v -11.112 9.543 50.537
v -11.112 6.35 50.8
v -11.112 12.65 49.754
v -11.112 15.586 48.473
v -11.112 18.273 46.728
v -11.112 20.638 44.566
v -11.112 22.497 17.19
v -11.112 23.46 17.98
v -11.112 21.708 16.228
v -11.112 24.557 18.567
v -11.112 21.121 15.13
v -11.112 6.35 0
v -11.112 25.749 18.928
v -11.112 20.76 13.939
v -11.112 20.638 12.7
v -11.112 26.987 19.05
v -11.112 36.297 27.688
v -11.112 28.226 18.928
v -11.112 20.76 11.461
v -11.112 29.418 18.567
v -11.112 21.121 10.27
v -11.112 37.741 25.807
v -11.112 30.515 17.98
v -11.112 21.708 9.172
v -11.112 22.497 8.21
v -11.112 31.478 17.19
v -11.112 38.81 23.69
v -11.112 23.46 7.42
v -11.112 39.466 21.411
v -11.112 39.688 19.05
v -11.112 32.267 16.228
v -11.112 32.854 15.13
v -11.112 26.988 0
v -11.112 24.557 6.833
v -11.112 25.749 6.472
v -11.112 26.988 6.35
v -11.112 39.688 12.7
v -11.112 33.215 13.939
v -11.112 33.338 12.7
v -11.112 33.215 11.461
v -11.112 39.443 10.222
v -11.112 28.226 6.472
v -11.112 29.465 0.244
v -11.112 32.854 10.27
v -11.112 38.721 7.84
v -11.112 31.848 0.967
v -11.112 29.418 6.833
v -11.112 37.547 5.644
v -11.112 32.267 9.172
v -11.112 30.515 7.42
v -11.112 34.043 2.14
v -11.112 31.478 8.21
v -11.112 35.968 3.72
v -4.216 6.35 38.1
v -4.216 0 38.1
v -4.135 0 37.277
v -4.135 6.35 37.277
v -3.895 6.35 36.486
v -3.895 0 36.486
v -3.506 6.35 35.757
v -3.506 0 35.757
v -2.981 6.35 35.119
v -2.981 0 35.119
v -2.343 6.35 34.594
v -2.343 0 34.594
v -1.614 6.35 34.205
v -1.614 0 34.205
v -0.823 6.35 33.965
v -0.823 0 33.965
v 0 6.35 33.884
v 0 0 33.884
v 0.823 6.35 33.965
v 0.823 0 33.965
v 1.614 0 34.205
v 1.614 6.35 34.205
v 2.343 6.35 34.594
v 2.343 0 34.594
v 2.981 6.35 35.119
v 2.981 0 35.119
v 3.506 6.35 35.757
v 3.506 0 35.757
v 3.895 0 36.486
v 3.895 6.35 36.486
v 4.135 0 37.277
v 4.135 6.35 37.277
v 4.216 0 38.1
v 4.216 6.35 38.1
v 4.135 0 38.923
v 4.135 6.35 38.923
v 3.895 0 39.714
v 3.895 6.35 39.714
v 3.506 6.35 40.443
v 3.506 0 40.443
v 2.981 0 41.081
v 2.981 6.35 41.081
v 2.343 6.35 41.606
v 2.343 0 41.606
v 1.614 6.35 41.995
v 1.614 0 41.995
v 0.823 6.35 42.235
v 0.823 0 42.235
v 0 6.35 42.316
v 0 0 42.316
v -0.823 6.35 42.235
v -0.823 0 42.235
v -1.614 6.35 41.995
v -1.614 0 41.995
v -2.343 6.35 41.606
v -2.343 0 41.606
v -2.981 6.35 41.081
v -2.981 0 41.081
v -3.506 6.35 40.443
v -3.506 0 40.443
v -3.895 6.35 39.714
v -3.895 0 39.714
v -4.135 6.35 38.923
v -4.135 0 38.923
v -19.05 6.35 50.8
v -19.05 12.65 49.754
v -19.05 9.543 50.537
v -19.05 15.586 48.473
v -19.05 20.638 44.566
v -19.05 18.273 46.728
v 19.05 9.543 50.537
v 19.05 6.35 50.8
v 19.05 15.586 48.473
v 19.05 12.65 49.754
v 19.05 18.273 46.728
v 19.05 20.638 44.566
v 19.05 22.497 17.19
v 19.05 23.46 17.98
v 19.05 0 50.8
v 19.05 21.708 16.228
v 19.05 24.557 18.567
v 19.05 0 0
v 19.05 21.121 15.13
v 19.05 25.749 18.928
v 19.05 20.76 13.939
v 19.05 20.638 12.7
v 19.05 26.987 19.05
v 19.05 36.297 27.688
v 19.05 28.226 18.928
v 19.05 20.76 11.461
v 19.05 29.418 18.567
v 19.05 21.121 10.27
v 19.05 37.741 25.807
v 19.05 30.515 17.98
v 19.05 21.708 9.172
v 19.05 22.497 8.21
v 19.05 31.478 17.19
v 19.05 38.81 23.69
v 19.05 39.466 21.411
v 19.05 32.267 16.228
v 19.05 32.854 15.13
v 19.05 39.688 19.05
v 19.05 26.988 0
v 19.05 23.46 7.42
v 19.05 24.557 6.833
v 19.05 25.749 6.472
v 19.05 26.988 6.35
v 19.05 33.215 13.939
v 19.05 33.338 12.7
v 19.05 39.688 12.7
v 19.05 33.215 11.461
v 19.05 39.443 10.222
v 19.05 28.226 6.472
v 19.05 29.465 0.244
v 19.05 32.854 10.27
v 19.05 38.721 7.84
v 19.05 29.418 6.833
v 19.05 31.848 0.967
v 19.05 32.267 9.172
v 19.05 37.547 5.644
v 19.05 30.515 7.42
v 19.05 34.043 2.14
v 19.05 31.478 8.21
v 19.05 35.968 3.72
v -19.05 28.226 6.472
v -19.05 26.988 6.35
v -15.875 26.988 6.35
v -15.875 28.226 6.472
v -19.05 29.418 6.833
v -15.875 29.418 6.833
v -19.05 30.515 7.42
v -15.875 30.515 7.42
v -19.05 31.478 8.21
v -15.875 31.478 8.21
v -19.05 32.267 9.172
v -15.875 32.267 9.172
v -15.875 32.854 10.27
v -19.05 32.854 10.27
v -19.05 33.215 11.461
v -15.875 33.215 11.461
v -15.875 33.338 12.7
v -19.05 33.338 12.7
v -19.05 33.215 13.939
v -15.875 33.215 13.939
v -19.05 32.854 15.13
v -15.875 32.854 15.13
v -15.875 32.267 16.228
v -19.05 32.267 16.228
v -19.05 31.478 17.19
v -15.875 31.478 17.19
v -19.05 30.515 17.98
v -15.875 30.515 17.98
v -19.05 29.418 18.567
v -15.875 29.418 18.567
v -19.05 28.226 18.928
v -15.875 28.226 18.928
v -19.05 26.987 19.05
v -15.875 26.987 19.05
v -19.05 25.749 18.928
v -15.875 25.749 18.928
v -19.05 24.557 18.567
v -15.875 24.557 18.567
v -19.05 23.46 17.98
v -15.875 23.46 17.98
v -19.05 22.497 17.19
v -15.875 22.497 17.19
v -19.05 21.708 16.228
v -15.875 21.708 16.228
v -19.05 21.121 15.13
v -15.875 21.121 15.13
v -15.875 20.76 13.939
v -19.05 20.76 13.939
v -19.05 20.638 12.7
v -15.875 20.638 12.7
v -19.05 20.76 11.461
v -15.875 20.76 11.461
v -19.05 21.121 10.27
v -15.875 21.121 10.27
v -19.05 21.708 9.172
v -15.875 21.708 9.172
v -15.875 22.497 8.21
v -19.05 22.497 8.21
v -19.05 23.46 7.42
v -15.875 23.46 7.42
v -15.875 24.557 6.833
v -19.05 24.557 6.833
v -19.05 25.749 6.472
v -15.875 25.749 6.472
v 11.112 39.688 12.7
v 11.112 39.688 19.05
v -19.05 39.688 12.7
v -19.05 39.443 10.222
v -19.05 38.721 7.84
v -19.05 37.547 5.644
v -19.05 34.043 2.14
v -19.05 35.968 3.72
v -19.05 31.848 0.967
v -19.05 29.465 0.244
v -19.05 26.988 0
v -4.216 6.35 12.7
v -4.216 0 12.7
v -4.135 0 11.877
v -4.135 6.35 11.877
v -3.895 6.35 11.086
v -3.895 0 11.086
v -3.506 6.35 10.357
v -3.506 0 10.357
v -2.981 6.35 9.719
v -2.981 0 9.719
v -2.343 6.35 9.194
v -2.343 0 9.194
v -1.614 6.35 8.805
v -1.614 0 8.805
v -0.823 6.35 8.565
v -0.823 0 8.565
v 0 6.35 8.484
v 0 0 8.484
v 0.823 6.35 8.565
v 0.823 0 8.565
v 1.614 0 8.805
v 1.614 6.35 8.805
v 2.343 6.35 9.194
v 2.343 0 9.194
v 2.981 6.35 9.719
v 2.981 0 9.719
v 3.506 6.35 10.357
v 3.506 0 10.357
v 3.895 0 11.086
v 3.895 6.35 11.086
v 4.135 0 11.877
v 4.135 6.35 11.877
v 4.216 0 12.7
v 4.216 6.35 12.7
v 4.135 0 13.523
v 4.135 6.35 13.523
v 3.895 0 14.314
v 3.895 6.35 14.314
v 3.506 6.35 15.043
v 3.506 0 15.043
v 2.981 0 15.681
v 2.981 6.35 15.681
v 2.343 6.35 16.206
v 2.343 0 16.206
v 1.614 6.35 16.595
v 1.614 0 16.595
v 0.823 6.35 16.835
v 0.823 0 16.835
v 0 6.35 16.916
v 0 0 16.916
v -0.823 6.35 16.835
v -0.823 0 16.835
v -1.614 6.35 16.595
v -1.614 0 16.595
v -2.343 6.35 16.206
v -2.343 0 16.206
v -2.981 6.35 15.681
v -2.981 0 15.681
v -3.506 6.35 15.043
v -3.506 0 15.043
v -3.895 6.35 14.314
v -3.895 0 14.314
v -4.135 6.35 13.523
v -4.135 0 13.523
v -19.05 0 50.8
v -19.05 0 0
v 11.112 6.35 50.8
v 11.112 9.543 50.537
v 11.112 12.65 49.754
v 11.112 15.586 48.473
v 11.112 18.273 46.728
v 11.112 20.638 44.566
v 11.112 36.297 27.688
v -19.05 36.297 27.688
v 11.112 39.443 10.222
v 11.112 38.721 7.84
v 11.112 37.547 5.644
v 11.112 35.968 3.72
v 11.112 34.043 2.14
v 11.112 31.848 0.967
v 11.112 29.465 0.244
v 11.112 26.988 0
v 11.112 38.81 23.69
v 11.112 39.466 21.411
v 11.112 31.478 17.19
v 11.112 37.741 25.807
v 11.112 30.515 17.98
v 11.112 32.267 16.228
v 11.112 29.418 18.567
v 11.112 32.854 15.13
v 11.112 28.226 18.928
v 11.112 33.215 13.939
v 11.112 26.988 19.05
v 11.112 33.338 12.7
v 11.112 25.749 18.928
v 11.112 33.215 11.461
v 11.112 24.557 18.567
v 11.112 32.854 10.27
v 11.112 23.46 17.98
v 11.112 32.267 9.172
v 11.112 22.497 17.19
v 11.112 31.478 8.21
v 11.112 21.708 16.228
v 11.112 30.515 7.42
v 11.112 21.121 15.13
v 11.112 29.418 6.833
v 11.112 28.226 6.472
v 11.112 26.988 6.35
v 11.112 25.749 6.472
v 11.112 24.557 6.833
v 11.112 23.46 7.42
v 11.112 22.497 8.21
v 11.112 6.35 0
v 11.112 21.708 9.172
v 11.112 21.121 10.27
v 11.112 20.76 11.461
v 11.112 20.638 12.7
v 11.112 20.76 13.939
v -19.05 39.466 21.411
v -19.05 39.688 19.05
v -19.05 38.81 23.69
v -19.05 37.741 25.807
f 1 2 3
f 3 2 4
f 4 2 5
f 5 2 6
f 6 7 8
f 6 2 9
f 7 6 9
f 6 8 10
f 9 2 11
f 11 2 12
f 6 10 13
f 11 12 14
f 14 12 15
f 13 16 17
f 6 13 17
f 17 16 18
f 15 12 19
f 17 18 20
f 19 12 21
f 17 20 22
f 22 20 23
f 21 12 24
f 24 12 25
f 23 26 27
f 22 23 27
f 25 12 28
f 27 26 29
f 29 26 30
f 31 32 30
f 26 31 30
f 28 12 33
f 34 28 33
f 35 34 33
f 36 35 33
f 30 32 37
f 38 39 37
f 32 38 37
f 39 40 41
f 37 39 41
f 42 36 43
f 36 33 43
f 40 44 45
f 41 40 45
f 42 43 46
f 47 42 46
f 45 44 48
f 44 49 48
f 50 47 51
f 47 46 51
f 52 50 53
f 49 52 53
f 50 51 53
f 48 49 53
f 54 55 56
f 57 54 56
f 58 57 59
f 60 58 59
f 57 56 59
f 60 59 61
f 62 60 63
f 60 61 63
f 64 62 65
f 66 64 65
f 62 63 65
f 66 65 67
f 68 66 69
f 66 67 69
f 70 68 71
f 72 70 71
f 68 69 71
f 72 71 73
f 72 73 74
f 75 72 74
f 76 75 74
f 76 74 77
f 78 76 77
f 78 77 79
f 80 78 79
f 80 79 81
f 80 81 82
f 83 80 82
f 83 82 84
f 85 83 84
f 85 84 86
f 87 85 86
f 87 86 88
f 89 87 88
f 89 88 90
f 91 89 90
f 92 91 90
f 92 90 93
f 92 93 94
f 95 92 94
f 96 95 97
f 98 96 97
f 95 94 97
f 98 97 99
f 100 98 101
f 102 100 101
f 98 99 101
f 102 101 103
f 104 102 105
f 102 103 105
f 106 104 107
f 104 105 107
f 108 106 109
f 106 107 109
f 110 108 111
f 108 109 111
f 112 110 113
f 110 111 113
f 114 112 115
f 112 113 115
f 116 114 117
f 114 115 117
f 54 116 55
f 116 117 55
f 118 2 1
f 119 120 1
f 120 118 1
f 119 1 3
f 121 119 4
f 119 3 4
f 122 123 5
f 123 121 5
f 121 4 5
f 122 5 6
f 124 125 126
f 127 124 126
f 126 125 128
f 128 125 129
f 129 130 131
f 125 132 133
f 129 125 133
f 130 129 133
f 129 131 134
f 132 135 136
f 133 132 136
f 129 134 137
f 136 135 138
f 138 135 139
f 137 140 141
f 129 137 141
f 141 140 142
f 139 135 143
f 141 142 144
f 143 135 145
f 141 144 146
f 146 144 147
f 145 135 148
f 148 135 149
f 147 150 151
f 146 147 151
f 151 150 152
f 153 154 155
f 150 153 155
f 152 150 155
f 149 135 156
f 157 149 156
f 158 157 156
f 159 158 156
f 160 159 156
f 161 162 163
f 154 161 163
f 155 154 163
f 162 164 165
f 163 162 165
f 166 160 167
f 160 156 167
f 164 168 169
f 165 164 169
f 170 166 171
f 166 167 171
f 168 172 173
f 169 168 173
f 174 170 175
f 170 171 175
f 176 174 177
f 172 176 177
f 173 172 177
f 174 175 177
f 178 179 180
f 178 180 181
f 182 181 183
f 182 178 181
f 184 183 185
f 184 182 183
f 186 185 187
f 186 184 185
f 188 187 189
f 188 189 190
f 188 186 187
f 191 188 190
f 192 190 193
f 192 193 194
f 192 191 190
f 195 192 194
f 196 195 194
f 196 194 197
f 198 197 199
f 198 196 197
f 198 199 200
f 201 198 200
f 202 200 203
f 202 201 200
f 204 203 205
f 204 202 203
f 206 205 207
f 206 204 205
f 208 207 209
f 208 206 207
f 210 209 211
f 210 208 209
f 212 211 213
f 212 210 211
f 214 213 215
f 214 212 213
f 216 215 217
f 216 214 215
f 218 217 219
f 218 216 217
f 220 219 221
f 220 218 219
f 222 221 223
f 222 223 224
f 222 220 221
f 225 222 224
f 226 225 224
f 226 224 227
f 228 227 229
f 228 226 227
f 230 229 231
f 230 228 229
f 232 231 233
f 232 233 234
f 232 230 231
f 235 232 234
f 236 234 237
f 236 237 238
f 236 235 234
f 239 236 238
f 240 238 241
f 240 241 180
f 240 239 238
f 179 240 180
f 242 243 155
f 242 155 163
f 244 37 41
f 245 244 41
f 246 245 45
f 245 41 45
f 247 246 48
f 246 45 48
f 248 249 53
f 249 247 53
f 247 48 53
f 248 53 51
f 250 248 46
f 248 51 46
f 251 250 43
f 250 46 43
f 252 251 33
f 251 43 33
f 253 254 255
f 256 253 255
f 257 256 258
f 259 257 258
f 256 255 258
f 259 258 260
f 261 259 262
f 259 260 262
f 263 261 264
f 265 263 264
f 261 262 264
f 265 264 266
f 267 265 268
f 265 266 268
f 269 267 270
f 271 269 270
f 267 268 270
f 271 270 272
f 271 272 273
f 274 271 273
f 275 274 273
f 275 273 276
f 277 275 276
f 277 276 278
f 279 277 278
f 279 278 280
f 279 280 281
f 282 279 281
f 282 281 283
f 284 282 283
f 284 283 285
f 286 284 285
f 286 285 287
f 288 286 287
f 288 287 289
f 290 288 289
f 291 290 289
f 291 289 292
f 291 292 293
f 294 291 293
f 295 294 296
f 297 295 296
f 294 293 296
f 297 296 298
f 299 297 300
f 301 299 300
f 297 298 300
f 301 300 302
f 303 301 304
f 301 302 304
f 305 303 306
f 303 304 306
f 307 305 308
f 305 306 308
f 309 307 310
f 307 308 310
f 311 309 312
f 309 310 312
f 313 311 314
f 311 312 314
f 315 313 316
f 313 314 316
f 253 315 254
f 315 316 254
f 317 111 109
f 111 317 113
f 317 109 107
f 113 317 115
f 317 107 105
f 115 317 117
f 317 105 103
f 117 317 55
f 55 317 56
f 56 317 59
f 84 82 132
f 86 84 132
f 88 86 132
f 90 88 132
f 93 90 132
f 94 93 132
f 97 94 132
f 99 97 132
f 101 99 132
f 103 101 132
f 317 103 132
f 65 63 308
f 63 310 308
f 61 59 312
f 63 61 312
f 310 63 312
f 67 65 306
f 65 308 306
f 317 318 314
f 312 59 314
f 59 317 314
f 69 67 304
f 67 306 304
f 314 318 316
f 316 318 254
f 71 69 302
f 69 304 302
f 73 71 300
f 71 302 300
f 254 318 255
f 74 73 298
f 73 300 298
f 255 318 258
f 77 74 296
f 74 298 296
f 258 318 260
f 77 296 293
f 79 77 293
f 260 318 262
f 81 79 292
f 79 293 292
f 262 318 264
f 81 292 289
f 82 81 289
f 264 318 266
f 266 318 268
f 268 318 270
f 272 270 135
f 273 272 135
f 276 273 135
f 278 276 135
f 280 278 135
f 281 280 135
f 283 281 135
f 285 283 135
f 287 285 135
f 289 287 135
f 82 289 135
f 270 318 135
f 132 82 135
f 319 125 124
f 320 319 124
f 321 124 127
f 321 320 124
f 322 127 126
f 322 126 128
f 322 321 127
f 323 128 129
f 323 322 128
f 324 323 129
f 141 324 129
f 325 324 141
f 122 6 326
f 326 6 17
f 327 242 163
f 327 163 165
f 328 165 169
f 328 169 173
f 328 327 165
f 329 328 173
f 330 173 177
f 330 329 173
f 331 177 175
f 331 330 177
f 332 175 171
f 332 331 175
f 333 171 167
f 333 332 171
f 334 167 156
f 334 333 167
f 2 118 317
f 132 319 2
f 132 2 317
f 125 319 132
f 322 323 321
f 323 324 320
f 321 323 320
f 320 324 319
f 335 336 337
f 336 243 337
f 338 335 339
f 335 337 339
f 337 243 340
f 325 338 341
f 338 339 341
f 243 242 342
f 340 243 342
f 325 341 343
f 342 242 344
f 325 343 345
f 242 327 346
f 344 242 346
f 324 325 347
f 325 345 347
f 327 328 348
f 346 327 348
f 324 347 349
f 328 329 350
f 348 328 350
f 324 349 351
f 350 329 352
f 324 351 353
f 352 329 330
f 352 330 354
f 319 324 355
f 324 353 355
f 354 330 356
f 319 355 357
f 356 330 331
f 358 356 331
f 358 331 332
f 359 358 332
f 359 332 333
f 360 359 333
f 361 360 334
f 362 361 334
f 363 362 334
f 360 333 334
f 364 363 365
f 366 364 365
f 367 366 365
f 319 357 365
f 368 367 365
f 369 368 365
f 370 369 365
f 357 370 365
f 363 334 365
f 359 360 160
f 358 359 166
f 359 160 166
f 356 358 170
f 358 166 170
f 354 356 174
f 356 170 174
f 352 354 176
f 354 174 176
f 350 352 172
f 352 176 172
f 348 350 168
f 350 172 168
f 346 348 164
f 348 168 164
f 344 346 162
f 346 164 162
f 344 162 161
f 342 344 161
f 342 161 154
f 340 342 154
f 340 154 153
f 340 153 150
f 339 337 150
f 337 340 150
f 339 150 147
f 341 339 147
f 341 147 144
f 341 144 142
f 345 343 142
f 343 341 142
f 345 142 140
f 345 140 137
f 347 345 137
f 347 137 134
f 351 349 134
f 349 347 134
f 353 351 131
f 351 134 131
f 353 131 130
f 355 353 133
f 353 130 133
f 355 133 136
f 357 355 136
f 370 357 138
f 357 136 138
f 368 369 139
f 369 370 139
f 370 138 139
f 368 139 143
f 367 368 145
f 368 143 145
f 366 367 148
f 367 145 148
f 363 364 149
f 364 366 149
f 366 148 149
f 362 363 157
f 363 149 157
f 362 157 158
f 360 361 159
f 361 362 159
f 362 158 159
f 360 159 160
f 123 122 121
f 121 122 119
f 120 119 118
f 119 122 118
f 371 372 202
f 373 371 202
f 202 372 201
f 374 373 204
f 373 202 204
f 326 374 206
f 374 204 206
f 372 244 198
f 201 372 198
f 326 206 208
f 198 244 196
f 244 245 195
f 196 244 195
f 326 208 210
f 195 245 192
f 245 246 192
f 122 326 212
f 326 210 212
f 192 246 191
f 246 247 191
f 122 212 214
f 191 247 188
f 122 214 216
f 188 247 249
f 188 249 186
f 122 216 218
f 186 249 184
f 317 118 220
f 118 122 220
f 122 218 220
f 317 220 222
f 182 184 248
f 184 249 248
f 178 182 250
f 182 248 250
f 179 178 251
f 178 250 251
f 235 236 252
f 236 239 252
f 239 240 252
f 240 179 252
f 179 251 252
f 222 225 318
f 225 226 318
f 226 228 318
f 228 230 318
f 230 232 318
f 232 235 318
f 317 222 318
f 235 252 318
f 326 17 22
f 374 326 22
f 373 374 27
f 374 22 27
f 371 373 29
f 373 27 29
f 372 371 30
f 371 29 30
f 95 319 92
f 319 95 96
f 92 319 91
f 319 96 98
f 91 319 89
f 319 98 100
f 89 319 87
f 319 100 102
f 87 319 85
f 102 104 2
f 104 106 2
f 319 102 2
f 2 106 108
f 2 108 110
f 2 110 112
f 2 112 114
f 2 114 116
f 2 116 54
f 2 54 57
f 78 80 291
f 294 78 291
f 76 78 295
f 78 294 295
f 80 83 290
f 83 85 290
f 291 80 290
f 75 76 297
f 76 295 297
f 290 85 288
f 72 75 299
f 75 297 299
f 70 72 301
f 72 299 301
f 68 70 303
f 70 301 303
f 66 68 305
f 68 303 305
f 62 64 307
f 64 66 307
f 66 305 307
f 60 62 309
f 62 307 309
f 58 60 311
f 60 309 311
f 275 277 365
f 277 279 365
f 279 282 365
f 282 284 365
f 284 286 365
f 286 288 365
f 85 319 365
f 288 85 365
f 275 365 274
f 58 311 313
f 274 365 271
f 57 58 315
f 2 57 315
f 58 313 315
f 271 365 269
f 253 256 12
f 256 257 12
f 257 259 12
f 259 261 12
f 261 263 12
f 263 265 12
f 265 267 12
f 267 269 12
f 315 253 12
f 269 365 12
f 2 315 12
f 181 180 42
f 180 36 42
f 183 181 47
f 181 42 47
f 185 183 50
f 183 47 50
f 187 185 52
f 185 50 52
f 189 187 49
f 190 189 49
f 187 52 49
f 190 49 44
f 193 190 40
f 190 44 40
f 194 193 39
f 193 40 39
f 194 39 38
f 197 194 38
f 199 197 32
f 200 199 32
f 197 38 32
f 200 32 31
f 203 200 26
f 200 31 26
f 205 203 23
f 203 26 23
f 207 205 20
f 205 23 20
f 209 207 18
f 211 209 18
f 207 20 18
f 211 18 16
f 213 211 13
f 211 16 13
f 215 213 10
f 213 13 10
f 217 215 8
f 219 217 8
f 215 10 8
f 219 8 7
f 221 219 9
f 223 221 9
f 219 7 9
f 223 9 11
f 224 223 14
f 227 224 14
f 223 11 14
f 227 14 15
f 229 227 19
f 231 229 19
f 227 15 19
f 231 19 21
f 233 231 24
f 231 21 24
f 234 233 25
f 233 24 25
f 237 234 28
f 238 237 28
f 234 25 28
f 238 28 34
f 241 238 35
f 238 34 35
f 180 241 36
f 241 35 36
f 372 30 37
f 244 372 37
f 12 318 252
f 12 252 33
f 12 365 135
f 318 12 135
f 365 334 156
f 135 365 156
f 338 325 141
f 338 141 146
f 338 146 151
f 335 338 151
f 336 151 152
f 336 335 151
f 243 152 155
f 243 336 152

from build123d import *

# Parameters (mm, degrees)
BOSS_EXTRUDE1_DEPTH          = 50.8
CUT_EXTRUDE2_START           = -19.05
SKETCH2_3_R                  = 6.35
CUT_EXTRUDE2_DEPTH           = 3.175
SKETCH2_R                    = 6.35
CUT_EXTRUDE3_DEPTH           = 20.05
CUT_EXTRUDE3_DEPTH_BACK      = 20.05
F_5_16_CLEARANCE_HOLE1_D     = 8.4328
F_5_16_CLEARANCE_HOLE1_DEPTH = 19.05
F_5_16_CLEARANCE_HOLE1_TIP   = 2.533468714
CUT_EXTRUDE12_DEPTH          = 20.05
CUT_EXTRUDE12_DEPTH_BACK     = 20.05


with BuildPart() as part:
    # Sketch1 → Boss-Extrude1 (new body)
    with BuildSketch(Plane.XY):
        Polygon((-19.05, 0), (19.05, 0), (19.05, 50.8), (11.1125, 50.8), (11.1125, 6.35), (-11.1125, 6.35), (-11.1125, 50.8), (-19.05, 50.8), align=None)
    extrude(amount=BOSS_EXTRUDE1_DEPTH)

    # Sketch2_3 → Cut-Extrude2 (cut)
    with BuildSketch(Plane(origin=(0, 0, 0), x_dir=(0, 0, -1), z_dir=(1, 0, 0)).offset(CUT_EXTRUDE2_START)):
        with Locations((-12.7, 26.9875)):
            Circle(SKETCH2_3_R)
    cut_extrude2 = extrude(amount=CUT_EXTRUDE2_DEPTH, mode=Mode.SUBTRACT)

    # Mirror2: Cut-Extrude2 across plane
    add(cut_extrude2.mirror(Plane(origin=(0, 0, 0), x_dir=(0, 0, 1), z_dir=(1, 0, 0))), mode=Mode.SUBTRACT)

    # Sketch2 → Cut-Extrude3 (cut, two sides)
    with BuildSketch(Plane(origin=(0, 0, 0), x_dir=(0, 0, -1), z_dir=(1, 0, 0))) as cut_extrude3_sk:
        with Locations((-12.7, 26.9875)):
            Circle(SKETCH2_R)
    extrude(amount=CUT_EXTRUDE3_DEPTH, mode=Mode.SUBTRACT)
    extrude(cut_extrude3_sk.sketch, amount=-CUT_EXTRUDE3_DEPTH_BACK, mode=Mode.SUBTRACT)

    # 5_16 Clearance Hole1
    with Locations(Plane(origin=(0, 6.35, 0), x_dir=(1, 0, 0), z_dir=(0, 1, 0))):
        with Locations((0, -38.1), (0, -12.7)):
            Hole(F_5_16_CLEARANCE_HOLE1_D / 2, depth=F_5_16_CLEARANCE_HOLE1_DEPTH)
            with Locations((0, 0, -(F_5_16_CLEARANCE_HOLE1_DEPTH + F_5_16_CLEARANCE_HOLE1_TIP / 2))):  # 118° drill point
                Cone(0, F_5_16_CLEARANCE_HOLE1_D / 2, F_5_16_CLEARANCE_HOLE1_TIP, mode=Mode.SUBTRACT)

    # Sketch28 → Cut-Extrude12 (cut, two sides)
    with BuildSketch(Plane(origin=(0, 0, 0), x_dir=(0, 0, -1), z_dir=(1, 0, 0))) as cut_extrude12_sk:
        with BuildLine():
            Line((0, 50.8), (-50.8, 50.8))
            Line((-50.8, 50.8), (-50.8, 6.35))
            ThreePointArc((-50.8, 6.35), (-49.173704114, 14.144110837), (-44.566221155, 20.6375))
            Line((-44.566221155, 20.6375), (-27.687967891, 36.297468352))
            ThreePointArc((-27.687967891, 36.297468352), (-23.689687593, 38.809652893), (-19.05, 39.6875))
            Line((-19.05, 39.6875), (-12.7, 39.6875))
            ThreePointArc((-12.7, 39.6875), (-3.719743879, 35.967756121), (0, 26.9875))
            Line((0, 26.9875), (0, 50.8))
        make_face()
    extrude(amount=CUT_EXTRUDE12_DEPTH, mode=Mode.SUBTRACT)
    extrude(cut_extrude12_sk.sketch, amount=-CUT_EXTRUDE12_DEPTH_BACK, mode=Mode.SUBTRACT)


solid = part.part
